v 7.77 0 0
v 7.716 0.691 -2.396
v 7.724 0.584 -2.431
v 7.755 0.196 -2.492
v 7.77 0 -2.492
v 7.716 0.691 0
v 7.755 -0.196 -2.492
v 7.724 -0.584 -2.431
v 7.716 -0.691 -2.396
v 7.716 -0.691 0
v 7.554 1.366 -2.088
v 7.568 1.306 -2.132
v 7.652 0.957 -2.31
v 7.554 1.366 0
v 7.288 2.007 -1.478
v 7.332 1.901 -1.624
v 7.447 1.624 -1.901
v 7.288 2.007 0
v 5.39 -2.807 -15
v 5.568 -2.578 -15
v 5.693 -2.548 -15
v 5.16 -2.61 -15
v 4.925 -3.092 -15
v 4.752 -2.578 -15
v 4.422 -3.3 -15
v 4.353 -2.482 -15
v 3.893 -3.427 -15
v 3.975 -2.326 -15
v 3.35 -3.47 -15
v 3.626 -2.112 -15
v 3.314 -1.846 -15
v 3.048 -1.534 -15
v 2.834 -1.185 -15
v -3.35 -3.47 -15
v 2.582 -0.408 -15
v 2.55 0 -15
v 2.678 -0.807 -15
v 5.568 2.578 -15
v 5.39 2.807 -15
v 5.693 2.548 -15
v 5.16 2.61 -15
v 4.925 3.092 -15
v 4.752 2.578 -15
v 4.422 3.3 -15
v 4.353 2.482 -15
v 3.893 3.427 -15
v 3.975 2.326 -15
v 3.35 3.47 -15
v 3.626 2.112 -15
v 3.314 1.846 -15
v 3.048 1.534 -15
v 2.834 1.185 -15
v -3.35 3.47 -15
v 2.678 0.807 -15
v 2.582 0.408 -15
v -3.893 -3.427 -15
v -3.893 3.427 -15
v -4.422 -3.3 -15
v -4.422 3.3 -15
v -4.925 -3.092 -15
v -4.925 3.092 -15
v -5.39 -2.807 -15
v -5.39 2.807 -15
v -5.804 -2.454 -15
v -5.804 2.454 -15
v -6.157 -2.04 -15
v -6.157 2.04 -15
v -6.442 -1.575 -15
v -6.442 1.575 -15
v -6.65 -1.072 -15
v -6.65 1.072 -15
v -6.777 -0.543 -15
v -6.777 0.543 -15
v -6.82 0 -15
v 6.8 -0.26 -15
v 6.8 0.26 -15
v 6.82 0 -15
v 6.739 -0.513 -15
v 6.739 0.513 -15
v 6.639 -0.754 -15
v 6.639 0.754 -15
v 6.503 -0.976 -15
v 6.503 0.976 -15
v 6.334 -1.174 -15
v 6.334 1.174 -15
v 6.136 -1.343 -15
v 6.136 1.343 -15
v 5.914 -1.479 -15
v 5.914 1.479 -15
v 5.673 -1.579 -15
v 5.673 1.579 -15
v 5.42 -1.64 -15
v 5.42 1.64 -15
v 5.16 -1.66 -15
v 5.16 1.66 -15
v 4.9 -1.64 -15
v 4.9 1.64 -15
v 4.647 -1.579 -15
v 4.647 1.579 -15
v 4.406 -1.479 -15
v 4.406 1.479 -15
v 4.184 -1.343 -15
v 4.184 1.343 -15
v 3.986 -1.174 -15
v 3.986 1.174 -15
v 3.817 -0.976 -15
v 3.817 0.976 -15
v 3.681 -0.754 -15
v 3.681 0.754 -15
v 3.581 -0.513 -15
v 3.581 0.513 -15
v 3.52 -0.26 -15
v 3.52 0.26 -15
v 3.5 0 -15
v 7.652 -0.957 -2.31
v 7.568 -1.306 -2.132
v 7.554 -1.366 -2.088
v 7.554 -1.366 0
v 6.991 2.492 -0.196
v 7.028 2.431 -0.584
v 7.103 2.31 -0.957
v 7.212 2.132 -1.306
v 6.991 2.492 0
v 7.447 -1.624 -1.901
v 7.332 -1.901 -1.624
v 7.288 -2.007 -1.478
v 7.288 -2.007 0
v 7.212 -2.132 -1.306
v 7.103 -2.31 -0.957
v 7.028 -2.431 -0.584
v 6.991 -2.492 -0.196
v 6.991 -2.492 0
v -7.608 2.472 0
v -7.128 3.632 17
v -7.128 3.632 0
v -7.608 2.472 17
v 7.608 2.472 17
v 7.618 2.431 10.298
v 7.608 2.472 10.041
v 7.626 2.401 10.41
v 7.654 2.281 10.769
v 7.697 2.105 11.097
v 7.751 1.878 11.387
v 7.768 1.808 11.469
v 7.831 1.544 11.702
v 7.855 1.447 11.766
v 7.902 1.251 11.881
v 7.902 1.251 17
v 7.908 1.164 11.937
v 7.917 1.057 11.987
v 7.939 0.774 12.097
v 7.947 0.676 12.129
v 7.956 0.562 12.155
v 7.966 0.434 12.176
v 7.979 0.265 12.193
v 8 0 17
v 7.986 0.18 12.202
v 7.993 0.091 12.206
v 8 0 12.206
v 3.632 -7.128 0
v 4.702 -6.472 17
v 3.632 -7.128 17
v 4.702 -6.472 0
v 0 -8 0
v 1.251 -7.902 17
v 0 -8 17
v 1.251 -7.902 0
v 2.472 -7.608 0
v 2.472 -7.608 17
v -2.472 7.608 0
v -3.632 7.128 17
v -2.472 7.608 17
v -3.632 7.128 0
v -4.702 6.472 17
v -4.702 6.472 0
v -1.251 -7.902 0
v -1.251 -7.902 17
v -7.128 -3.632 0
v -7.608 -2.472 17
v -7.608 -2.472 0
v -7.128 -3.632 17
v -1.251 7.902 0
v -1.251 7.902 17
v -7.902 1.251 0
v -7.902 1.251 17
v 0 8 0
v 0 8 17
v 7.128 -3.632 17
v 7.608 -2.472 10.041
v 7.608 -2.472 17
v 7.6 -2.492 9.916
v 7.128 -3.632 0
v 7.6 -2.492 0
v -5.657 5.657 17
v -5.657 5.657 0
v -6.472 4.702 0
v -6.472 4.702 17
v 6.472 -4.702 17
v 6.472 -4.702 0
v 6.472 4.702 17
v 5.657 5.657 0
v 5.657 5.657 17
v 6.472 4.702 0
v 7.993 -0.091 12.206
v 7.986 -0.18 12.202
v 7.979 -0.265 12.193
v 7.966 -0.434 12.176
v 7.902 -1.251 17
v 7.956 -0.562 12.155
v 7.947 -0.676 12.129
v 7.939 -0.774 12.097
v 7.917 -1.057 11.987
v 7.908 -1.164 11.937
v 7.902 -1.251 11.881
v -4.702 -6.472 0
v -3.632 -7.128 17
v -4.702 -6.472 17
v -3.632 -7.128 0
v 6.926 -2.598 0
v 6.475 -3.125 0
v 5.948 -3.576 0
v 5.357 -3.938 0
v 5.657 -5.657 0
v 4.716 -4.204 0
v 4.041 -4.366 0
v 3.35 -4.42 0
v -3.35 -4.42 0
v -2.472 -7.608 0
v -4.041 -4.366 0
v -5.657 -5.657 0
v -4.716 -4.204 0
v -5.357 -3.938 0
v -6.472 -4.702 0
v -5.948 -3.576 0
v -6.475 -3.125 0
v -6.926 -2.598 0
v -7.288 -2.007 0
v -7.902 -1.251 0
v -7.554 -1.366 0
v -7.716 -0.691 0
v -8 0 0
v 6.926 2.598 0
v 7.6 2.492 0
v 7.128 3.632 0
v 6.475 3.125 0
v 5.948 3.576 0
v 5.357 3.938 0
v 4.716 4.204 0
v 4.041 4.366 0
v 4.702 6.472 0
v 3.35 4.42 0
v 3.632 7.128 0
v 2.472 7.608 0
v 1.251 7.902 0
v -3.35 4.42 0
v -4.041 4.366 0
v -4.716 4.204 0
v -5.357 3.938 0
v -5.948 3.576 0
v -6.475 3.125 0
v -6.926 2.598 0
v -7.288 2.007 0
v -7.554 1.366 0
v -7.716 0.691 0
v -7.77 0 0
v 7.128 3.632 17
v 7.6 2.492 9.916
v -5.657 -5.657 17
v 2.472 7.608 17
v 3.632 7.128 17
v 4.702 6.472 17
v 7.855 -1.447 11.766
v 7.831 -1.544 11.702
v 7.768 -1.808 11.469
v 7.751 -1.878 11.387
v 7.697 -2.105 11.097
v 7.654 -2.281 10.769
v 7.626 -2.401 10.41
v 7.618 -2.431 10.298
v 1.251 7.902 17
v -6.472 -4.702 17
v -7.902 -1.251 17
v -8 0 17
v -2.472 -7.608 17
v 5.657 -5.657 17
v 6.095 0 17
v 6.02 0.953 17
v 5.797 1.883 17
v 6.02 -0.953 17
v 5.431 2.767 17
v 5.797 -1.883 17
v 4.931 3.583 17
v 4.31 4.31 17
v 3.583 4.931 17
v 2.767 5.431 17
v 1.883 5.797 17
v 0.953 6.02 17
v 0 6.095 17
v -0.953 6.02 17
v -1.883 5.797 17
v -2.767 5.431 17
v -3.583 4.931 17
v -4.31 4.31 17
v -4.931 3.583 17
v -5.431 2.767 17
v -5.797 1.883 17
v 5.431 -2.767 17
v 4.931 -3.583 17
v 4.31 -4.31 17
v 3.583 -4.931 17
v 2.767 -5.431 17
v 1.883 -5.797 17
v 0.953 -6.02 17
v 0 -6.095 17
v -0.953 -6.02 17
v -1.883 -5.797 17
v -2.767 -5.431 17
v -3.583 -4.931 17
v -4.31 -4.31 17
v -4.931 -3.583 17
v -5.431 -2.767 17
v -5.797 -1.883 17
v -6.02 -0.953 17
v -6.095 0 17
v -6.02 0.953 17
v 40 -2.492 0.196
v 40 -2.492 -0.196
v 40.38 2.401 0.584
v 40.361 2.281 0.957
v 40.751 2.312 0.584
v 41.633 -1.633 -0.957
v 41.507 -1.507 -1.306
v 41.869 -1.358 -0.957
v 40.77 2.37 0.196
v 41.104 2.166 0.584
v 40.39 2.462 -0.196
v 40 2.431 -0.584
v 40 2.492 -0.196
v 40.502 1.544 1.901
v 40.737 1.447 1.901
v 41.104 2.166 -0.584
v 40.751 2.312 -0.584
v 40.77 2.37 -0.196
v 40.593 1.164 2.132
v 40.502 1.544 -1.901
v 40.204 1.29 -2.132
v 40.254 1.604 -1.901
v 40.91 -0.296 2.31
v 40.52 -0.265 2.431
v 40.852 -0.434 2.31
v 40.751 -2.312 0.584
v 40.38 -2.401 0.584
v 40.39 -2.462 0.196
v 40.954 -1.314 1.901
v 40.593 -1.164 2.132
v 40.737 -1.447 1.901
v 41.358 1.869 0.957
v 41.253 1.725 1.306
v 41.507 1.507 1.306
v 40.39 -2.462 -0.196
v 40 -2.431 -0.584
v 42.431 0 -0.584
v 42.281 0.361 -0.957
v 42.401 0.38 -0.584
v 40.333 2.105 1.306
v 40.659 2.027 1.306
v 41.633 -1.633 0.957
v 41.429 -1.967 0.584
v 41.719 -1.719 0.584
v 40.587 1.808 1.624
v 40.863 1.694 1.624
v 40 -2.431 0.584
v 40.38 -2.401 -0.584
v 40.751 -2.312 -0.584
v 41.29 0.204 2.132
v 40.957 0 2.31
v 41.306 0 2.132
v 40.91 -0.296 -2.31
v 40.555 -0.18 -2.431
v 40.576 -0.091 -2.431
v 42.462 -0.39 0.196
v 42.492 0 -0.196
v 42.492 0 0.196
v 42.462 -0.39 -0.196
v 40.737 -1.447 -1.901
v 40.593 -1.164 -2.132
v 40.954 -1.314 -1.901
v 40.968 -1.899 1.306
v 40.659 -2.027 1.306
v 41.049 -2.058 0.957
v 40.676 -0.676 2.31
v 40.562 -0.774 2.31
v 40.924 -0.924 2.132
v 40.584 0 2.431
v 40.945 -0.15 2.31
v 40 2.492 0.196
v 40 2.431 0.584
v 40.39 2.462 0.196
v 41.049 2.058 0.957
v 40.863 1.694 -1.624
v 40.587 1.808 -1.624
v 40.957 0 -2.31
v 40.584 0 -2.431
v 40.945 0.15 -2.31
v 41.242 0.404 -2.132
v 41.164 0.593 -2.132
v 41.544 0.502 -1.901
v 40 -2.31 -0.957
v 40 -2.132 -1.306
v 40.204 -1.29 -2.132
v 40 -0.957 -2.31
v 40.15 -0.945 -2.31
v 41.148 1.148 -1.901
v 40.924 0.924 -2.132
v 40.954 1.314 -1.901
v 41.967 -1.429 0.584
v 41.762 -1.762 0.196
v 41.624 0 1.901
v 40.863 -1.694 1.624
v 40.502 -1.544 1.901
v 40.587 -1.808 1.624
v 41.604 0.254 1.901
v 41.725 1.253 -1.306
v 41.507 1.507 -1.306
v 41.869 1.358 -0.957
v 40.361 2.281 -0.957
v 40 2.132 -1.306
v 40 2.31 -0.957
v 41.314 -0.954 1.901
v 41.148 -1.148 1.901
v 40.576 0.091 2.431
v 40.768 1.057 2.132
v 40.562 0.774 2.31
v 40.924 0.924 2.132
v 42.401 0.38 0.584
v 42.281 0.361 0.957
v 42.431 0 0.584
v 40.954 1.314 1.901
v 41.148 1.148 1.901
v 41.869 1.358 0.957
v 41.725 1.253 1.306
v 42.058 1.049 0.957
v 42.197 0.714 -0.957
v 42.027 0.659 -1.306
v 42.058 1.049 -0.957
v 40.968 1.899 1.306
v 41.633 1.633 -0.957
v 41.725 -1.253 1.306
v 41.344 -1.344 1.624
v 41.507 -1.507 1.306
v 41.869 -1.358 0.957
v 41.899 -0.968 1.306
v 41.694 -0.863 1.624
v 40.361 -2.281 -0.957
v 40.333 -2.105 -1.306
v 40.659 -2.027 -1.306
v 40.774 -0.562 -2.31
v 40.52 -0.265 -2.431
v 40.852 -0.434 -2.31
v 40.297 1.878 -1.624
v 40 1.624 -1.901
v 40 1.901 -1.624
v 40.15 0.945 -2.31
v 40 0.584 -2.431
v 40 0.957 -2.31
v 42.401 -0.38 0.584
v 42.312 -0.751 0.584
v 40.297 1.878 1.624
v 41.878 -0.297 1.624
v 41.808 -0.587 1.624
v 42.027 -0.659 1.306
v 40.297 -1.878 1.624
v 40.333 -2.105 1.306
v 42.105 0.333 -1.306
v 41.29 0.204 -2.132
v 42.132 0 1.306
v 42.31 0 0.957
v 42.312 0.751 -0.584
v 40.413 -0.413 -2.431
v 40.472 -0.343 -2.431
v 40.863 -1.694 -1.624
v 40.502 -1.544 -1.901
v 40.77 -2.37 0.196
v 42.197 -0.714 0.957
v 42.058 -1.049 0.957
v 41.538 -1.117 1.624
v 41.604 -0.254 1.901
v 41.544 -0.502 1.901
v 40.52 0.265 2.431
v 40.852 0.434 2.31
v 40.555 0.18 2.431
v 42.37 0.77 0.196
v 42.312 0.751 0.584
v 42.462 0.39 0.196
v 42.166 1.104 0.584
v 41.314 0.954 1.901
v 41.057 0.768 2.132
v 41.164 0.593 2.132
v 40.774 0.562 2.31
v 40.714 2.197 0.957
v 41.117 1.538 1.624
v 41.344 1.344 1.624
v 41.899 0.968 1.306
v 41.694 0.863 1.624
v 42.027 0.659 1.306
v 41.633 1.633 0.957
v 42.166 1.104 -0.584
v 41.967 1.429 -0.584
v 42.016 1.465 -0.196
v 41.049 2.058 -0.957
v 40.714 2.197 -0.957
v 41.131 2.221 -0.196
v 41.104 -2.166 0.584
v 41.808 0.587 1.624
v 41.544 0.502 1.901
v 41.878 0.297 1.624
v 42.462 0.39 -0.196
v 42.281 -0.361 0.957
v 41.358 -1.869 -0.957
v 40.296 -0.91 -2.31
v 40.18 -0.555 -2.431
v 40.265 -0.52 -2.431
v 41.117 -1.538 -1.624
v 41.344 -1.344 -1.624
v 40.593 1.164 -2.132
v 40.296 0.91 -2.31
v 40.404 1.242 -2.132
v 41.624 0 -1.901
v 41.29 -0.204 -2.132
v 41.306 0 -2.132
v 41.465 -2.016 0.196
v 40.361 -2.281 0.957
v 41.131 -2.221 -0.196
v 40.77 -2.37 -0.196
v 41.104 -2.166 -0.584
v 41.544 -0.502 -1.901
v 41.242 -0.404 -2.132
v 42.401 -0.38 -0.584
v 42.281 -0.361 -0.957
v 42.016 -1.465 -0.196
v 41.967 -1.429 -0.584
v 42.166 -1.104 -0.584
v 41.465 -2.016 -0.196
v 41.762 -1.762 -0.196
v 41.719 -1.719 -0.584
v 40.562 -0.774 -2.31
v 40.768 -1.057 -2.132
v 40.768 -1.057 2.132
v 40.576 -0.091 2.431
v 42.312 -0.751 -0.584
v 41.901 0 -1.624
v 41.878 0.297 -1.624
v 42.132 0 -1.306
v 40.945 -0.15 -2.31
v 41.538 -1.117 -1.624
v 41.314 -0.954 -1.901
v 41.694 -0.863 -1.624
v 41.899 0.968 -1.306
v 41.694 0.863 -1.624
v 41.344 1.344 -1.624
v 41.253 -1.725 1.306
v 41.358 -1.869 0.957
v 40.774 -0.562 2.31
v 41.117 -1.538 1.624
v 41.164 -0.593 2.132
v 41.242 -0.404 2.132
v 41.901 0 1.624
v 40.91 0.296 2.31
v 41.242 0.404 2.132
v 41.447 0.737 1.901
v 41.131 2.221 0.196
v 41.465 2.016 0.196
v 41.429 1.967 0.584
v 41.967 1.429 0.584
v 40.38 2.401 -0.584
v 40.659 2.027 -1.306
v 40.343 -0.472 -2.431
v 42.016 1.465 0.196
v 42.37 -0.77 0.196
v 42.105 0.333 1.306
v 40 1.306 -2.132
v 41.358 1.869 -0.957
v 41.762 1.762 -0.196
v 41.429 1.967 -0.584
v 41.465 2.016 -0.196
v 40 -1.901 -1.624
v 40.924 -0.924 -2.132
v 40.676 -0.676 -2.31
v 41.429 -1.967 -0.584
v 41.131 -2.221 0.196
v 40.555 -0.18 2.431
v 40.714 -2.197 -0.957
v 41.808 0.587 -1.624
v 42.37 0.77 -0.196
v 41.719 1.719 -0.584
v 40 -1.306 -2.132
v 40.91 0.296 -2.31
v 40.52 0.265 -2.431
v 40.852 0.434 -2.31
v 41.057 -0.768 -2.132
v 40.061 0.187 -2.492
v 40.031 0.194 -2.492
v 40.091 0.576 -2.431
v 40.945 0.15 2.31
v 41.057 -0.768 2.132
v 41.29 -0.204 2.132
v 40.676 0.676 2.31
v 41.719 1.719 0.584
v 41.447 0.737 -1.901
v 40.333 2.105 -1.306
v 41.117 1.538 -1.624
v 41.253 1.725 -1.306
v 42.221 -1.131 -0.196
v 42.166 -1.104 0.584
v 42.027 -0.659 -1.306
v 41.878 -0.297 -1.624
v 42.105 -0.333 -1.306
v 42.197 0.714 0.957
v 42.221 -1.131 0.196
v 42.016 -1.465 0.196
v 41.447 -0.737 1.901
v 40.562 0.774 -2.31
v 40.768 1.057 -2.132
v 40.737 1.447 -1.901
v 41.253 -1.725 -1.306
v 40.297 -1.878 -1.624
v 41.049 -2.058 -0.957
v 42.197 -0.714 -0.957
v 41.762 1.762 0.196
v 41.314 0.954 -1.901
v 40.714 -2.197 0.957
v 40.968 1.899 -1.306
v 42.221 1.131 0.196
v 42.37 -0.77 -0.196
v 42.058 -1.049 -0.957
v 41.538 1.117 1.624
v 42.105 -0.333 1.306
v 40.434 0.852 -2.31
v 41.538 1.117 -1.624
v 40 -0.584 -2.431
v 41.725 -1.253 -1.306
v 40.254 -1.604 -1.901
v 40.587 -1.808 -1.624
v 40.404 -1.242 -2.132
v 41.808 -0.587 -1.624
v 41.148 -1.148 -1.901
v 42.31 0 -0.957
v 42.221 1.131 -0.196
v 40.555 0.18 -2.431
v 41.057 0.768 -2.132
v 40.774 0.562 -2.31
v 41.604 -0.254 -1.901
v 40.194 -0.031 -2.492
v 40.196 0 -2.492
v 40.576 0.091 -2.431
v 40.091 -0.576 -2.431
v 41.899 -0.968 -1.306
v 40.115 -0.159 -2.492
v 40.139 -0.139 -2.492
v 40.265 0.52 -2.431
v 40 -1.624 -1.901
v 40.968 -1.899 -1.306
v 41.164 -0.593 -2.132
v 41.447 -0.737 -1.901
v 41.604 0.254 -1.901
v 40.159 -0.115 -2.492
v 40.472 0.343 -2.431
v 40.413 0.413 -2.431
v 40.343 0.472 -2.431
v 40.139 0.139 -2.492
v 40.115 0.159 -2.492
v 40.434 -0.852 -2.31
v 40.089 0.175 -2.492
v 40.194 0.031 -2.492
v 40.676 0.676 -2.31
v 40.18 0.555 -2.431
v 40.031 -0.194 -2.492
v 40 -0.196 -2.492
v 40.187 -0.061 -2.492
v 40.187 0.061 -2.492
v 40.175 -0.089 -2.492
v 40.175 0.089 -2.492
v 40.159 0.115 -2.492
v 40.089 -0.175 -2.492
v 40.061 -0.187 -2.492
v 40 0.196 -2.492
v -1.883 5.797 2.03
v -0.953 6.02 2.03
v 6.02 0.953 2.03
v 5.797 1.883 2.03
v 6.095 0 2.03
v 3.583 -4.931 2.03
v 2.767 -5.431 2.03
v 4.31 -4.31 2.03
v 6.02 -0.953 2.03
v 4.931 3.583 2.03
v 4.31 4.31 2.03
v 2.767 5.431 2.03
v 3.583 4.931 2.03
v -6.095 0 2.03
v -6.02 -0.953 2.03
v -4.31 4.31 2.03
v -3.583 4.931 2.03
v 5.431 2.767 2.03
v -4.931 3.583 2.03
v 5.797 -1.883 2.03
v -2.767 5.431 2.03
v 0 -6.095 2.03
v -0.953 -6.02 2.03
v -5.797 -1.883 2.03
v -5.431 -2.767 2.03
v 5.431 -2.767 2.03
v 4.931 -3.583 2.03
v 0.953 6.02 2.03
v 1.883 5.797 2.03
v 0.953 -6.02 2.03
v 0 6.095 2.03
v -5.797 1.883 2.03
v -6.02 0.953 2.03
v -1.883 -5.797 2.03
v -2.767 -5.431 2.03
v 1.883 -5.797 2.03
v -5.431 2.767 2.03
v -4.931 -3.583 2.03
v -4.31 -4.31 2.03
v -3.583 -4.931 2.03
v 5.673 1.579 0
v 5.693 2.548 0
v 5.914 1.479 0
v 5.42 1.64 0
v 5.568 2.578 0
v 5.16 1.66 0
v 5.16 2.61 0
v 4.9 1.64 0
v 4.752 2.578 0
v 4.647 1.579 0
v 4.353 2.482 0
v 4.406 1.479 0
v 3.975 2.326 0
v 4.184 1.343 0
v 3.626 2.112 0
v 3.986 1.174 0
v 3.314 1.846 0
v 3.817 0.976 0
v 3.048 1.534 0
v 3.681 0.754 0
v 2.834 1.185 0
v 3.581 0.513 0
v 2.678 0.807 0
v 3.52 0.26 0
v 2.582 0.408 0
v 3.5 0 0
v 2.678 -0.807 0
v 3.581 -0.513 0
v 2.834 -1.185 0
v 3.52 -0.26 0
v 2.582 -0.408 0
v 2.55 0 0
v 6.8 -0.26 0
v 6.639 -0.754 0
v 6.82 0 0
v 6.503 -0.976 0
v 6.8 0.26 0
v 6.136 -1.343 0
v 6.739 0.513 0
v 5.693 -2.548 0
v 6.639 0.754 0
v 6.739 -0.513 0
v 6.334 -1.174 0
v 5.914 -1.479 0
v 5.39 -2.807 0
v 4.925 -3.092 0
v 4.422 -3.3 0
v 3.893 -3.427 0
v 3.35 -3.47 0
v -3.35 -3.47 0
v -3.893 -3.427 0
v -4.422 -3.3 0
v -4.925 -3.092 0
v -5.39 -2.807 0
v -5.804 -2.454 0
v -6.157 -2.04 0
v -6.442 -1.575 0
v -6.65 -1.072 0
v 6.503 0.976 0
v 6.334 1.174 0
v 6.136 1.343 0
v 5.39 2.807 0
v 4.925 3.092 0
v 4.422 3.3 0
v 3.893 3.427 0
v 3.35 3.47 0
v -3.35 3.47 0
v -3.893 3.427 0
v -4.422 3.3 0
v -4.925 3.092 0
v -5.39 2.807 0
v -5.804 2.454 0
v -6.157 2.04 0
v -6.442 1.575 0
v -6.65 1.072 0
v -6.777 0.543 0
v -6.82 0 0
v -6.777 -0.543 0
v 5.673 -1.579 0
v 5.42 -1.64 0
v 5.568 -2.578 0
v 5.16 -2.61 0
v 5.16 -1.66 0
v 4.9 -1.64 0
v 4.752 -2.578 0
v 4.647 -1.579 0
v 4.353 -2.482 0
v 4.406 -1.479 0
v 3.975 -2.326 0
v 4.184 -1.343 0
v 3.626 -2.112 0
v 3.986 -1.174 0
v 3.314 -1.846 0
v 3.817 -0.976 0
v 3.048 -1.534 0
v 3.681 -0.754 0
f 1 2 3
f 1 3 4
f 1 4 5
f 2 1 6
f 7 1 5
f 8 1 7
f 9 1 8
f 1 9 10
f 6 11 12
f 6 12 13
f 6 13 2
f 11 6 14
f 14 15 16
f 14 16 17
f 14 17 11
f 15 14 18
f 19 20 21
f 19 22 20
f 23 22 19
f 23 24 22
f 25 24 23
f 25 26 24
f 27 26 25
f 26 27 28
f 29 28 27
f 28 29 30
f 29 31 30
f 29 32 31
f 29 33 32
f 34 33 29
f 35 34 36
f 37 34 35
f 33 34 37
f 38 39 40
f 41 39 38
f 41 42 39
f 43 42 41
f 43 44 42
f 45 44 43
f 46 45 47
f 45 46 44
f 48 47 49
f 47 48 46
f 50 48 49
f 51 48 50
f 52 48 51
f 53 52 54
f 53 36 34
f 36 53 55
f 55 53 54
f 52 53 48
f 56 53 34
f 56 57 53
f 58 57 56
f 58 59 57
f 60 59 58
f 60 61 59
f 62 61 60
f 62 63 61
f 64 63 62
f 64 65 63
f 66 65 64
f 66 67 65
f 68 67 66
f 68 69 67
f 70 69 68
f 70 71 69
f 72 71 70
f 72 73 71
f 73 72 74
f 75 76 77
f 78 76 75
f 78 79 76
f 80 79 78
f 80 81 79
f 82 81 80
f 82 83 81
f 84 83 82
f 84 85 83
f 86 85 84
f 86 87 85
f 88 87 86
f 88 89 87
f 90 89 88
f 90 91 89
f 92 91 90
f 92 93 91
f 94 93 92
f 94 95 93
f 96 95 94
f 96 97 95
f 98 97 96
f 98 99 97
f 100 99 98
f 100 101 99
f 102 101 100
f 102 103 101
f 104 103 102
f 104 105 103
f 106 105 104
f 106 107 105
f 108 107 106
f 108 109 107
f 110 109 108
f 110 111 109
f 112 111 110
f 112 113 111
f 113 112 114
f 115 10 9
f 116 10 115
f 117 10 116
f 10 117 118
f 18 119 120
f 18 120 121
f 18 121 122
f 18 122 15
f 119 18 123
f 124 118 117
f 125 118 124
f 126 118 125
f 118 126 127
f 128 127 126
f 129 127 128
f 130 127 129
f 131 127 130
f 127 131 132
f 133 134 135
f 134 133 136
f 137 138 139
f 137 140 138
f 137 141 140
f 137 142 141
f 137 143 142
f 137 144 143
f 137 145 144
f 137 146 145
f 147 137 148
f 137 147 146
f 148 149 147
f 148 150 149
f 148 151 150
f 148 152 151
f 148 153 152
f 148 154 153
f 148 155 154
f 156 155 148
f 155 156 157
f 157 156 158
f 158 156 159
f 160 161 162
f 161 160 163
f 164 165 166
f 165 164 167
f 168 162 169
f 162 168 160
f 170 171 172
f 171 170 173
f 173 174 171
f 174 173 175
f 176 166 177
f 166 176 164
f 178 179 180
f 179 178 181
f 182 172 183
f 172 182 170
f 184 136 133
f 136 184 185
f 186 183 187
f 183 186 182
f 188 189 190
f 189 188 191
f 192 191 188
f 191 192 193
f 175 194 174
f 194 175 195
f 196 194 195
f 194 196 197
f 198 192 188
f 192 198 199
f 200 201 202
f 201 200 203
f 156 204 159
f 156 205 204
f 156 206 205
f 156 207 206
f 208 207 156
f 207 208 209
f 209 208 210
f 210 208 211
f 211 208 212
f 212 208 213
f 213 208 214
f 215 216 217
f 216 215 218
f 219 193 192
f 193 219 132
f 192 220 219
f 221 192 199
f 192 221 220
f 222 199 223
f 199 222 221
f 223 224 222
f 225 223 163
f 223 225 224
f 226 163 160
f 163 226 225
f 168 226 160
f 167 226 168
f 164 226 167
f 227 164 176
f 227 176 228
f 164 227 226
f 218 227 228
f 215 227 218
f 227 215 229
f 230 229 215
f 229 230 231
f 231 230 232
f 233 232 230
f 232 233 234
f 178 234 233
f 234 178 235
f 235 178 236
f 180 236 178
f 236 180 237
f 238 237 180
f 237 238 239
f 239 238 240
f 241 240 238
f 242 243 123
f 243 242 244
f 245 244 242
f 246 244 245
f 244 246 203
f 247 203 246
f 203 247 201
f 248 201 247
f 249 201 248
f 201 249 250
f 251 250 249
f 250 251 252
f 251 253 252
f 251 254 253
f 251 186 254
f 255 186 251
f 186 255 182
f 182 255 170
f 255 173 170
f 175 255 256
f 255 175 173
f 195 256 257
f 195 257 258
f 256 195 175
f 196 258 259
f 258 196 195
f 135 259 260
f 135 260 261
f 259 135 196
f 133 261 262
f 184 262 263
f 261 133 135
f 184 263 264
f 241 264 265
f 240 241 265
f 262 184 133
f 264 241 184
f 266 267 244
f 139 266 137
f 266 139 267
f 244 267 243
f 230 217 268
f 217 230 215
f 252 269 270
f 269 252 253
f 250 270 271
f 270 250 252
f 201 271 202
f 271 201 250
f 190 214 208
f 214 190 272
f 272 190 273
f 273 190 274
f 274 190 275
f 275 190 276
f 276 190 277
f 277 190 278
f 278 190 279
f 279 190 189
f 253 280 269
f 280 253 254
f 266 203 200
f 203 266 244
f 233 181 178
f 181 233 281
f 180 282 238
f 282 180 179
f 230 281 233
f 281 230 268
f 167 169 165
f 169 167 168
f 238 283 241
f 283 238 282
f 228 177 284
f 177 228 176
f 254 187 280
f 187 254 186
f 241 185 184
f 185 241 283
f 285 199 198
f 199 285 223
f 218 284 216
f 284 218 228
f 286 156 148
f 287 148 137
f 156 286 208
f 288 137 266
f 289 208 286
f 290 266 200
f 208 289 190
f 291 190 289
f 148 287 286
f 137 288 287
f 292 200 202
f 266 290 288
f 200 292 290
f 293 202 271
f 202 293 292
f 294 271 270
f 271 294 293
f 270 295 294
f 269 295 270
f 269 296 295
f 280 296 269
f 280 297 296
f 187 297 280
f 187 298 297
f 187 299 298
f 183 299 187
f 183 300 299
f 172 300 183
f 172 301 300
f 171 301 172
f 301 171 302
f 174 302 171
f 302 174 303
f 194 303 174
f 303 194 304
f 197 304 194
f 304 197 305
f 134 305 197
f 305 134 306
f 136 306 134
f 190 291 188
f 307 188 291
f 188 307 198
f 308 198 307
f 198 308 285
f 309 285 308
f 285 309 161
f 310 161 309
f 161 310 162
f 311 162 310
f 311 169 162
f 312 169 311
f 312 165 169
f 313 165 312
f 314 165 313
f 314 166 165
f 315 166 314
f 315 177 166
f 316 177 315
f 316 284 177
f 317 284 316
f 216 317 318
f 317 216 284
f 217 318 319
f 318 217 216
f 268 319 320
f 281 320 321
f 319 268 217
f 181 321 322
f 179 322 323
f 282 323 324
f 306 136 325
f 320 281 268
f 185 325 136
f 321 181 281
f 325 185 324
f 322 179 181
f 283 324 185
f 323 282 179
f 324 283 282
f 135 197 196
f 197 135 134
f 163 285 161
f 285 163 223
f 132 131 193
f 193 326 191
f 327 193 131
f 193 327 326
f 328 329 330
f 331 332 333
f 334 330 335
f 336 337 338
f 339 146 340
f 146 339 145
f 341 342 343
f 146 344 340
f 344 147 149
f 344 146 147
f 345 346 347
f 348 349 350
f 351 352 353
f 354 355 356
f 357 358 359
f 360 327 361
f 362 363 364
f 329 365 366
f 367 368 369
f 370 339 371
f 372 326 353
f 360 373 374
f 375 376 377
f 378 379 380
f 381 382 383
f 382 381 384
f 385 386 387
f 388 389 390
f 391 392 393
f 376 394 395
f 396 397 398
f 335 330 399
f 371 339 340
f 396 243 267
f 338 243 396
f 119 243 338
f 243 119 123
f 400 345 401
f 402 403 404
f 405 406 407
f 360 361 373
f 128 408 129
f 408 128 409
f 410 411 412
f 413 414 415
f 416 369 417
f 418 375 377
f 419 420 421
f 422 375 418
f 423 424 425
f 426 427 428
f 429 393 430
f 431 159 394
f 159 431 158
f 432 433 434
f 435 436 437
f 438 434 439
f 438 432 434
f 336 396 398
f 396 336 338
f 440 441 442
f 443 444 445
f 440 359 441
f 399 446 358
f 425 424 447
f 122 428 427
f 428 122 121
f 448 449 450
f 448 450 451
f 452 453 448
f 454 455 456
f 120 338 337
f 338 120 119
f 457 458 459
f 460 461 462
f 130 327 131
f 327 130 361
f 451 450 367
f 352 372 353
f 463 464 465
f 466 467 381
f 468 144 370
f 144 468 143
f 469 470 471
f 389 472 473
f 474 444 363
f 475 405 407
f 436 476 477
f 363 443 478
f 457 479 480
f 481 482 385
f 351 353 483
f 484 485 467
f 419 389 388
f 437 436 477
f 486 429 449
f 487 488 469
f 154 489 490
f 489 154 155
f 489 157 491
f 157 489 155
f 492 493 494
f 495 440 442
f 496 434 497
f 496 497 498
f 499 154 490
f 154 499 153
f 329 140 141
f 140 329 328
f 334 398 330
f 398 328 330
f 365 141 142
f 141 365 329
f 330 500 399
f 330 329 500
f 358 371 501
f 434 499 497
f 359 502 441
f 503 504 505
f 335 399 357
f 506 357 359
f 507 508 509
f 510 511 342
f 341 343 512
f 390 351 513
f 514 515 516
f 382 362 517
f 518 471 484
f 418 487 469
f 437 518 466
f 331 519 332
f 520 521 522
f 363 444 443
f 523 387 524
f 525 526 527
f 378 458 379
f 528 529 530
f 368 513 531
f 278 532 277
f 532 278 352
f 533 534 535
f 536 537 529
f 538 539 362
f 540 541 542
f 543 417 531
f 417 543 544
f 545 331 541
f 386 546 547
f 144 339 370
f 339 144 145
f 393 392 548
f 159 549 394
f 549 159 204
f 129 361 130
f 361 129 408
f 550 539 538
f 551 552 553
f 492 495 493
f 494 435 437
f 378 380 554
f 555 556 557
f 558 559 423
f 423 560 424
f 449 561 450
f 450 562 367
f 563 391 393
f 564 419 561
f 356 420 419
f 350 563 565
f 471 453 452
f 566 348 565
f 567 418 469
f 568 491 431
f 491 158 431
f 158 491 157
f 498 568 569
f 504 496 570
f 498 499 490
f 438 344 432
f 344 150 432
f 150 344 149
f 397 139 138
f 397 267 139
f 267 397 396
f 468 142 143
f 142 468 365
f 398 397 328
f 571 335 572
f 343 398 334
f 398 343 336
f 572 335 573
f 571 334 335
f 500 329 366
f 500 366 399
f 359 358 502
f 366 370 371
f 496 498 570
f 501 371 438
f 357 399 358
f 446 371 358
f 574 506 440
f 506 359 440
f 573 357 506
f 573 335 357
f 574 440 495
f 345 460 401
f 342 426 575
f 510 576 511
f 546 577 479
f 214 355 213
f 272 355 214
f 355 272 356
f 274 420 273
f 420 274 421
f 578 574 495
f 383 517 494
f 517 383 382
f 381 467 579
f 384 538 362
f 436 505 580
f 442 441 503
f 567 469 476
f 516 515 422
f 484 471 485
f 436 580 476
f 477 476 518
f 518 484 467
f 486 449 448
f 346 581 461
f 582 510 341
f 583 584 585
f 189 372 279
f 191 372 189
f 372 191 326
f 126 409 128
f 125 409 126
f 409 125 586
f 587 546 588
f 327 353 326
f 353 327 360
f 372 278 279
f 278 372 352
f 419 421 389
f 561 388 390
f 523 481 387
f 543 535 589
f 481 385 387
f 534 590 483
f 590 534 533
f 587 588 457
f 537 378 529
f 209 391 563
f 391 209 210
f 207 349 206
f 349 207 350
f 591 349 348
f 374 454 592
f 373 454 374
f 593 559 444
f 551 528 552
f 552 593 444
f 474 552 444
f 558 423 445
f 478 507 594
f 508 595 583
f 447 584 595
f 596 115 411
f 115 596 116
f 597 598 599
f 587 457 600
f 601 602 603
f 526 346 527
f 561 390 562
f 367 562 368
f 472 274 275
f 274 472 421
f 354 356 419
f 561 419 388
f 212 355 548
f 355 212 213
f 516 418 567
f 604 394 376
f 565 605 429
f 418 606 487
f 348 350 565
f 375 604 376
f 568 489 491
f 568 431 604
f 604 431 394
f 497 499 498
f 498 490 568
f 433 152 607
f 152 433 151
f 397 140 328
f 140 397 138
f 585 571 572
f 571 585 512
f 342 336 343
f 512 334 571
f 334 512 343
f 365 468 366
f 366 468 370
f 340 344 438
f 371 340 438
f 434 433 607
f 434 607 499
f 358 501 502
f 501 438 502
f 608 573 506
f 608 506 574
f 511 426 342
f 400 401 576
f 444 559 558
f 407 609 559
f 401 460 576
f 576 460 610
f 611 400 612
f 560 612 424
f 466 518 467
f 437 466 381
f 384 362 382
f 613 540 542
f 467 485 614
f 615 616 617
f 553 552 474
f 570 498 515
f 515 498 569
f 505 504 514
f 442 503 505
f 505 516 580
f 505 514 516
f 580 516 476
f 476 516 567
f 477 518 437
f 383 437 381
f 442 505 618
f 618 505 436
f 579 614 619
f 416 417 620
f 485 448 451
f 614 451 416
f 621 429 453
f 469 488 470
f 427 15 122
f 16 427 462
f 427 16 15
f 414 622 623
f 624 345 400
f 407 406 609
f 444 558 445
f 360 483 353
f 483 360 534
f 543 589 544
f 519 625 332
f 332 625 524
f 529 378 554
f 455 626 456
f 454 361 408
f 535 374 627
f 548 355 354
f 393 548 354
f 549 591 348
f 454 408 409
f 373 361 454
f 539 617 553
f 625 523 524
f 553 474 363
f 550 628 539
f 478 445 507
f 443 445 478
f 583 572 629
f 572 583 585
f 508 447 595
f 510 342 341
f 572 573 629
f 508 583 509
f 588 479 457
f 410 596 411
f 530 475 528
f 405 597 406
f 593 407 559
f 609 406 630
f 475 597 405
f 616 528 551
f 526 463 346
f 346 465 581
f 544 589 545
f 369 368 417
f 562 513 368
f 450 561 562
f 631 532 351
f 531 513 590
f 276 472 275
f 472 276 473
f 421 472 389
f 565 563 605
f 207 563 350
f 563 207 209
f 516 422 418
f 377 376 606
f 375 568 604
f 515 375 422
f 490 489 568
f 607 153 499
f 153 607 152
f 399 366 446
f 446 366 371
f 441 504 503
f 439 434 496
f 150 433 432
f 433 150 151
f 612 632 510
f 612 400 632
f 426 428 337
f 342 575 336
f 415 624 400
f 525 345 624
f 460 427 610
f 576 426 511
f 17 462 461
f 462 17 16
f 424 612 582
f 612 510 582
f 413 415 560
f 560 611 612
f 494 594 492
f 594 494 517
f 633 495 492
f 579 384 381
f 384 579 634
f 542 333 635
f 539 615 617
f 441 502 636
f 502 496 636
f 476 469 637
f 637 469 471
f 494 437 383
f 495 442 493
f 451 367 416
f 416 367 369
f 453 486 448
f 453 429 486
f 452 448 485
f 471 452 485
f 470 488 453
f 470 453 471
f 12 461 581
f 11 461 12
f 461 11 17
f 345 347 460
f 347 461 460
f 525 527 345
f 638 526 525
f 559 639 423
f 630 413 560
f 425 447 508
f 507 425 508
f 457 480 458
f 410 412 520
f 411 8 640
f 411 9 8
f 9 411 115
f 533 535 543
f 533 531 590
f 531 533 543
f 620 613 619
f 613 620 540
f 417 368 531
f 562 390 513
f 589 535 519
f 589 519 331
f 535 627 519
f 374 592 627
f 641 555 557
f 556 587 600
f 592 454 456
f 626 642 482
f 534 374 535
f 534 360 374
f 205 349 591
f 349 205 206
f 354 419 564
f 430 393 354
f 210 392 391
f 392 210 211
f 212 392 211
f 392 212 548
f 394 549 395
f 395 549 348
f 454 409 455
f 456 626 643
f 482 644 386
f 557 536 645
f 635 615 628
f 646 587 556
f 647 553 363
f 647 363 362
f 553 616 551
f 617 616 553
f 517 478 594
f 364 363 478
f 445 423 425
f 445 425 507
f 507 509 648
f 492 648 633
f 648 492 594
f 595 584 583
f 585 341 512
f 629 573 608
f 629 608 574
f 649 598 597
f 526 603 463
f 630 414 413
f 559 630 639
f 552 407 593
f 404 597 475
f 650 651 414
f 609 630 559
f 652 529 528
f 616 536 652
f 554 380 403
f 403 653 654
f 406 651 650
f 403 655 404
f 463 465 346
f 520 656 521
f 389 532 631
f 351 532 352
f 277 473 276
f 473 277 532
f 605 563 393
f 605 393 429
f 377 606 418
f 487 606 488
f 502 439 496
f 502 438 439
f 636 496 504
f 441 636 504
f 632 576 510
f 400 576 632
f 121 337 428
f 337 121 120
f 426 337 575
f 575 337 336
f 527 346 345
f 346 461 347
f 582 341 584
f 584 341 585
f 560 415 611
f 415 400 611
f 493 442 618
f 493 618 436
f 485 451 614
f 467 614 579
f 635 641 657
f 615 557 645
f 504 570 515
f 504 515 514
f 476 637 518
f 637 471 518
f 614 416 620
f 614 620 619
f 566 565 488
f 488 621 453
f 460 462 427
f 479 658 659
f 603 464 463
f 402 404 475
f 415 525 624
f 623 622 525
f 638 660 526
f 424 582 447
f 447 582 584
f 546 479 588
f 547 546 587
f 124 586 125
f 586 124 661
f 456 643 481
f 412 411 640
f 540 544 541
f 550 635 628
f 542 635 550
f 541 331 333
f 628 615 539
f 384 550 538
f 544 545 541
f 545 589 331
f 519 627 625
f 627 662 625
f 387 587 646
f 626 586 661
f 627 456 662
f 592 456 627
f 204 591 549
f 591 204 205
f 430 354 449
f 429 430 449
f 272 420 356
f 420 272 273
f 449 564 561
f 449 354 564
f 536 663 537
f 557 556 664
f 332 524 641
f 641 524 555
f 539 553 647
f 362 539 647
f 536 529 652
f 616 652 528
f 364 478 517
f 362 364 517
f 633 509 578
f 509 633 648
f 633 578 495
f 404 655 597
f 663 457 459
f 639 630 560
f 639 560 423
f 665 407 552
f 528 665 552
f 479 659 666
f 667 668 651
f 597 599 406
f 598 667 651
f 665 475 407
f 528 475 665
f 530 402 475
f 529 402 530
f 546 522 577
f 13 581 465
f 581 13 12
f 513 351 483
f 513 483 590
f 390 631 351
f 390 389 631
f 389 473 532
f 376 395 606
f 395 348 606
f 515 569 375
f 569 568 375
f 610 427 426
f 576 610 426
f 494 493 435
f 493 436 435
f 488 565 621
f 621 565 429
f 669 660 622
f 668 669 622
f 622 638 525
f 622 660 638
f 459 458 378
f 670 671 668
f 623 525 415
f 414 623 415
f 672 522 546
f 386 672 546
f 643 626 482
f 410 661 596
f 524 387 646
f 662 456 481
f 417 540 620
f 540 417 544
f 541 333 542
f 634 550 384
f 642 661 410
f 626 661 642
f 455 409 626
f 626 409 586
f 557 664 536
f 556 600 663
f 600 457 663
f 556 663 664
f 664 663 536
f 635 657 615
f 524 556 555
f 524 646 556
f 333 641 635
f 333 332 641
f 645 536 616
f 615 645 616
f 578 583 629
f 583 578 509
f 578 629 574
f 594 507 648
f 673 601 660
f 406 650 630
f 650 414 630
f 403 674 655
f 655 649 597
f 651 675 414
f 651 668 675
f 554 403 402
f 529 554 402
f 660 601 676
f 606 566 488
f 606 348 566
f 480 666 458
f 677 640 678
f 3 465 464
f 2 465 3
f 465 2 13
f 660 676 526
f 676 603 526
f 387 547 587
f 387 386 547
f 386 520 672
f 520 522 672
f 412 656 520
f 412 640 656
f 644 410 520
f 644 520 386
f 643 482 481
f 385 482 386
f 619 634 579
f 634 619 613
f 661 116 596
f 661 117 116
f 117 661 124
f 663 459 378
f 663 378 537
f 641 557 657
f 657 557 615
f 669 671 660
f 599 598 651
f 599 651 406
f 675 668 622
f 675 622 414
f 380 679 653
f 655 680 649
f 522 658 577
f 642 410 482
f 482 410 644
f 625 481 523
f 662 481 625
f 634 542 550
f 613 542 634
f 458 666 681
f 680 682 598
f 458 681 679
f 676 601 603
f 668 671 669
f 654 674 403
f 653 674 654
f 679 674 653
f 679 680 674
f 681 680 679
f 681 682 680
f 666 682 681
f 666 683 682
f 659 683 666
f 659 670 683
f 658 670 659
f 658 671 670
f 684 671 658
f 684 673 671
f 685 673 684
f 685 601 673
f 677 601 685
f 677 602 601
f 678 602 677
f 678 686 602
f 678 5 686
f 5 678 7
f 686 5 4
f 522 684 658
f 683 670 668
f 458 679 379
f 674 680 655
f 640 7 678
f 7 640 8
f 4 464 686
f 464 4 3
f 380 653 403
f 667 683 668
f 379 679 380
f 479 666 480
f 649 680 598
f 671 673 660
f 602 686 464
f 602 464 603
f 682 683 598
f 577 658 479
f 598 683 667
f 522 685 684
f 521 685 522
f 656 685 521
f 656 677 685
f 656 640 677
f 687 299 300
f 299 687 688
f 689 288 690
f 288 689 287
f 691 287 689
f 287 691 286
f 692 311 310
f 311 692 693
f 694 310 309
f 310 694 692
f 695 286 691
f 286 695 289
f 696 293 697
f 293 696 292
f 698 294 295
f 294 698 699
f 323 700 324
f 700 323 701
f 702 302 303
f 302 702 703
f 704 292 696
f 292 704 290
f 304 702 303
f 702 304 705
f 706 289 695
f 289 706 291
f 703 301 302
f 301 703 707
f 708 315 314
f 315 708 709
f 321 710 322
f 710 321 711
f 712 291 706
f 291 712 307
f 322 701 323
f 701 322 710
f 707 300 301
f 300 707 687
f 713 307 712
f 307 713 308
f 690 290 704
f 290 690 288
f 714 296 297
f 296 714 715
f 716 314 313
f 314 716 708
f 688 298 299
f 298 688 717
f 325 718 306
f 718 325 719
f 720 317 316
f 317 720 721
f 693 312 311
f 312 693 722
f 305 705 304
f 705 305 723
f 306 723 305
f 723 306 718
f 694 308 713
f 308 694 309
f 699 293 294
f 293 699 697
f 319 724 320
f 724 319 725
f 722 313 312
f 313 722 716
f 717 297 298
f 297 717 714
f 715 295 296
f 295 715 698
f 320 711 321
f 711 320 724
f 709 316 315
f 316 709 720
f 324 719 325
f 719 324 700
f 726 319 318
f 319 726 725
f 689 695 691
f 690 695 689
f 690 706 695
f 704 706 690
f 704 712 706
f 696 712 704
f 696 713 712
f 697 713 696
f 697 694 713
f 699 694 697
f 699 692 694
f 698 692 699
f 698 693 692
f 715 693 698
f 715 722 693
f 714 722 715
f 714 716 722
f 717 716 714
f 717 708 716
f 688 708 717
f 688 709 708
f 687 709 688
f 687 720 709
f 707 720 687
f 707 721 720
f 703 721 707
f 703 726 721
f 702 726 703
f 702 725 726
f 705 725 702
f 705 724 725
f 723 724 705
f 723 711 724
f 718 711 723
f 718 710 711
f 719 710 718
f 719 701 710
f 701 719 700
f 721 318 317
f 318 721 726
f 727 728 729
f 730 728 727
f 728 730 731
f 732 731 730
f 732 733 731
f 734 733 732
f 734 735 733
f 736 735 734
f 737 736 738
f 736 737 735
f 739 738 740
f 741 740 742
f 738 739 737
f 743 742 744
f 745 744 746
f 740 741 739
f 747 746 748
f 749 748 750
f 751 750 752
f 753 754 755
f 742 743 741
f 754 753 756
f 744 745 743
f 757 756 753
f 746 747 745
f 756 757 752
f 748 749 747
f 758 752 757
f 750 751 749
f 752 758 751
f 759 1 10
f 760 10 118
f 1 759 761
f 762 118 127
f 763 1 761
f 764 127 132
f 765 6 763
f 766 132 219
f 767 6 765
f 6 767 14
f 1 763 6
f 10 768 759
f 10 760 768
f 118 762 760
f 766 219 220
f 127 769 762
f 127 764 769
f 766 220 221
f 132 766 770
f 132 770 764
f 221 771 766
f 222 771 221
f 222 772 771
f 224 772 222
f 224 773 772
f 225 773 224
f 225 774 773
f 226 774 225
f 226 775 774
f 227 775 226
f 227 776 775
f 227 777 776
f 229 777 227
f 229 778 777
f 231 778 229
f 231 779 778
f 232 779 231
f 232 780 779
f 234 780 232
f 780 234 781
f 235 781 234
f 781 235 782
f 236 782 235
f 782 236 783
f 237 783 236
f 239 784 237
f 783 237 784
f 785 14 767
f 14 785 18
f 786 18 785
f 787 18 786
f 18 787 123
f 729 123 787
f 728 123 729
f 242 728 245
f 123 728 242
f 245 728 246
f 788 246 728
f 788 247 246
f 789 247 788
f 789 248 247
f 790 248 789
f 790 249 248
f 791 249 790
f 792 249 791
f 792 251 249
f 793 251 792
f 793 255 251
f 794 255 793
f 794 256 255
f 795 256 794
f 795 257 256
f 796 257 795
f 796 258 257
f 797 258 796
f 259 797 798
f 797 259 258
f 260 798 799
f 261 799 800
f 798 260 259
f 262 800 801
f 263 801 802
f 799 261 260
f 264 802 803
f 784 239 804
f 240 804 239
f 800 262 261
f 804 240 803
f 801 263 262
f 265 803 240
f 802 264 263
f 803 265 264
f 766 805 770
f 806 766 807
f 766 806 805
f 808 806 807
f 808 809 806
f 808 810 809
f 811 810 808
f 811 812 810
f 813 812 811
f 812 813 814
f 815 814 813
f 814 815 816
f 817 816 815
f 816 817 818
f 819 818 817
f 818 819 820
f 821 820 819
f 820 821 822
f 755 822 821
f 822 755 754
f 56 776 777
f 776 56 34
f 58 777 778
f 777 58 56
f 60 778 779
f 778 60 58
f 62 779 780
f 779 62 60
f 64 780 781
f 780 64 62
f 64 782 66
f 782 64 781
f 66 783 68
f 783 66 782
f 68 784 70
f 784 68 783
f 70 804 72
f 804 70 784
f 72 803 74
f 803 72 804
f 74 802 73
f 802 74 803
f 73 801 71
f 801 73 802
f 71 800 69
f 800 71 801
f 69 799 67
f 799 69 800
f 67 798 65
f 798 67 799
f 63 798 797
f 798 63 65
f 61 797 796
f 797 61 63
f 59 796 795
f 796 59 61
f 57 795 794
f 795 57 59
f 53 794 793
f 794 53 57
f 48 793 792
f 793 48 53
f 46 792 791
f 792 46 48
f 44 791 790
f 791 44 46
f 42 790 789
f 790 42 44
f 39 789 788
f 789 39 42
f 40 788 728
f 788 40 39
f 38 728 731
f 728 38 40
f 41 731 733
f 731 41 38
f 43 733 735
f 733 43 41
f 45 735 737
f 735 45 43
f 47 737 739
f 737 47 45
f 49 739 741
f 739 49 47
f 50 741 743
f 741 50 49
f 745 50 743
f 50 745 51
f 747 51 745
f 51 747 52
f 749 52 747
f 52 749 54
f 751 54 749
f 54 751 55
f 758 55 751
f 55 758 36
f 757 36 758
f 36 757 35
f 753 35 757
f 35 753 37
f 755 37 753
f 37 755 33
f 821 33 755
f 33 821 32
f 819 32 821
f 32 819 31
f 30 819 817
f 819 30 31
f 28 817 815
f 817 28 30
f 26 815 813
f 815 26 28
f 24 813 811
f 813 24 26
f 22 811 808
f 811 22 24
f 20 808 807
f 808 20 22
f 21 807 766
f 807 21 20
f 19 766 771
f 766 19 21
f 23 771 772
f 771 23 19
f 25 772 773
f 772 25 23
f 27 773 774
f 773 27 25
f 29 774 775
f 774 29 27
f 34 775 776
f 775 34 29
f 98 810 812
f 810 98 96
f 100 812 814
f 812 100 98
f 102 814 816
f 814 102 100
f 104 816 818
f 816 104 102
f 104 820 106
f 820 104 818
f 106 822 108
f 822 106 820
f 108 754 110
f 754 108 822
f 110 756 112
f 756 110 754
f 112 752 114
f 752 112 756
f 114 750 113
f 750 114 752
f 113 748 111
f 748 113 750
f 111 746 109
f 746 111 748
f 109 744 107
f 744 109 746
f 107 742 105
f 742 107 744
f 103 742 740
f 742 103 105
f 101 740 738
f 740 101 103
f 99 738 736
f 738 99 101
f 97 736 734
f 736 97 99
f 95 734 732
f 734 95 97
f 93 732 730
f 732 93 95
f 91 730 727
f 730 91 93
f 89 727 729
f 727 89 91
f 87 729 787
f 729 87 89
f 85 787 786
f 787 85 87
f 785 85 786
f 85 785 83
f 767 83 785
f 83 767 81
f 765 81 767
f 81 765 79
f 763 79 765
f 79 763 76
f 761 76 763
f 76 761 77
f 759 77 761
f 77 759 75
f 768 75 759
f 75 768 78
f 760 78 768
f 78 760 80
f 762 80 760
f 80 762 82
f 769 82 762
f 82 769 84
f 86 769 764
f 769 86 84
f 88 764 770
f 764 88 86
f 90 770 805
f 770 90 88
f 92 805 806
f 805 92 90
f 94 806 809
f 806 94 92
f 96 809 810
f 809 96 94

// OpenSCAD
$fn=40;

mast_height=50;

module mast2d(){
    outside_width=8.84;
    inside_width=6.94;
    center_distance=6.7; // The distance between the two centers that make up the mast
    rope_inside_diameter=3.32;
    rope_outside_diameter=5.22;
    
    module mastOval(diameter){
        hull(){
            translate([center_distance/2,0]) circle(d=diameter);
            translate([-center_distance/2,0]) circle(d=diameter);
        }
    }
    
    // Outer shell
    difference(){
        mastOval(outside_width);
        mastOval(inside_width);
    }
    
    translate([center_distance/2+outside_width/2-rope_outside_diameter/2, 0])
        difference(){
            circle(d=rope_outside_diameter);
            circle(d=rope_inside_diameter);
        }
}

module ma3(){
    // Attachment point is bottom of thread area.
    height=14.98;
    diameter=12.19;
    thread_height=7.62;
    thread_diameter=9.5;
    shaft_height=9.65;
    shaft_diameter=3.14;
    
    translate([0,0,-height]) cylinder(d=diameter, h=height);
    cylinder(d=thread_diameter, h=thread_height);
    translate([0,0,thread_height]) cylinder(d=shaft_diameter, h=shaft_height);
}

 crane_length=40;
crane_height=12;
crane_thickness=5;
ma3_holder_diameter=16;
ma3_holder_height=17;

difference(){
    union(){
        mast_overlap_distance=15;
        translate([0,0,-mast_overlap_distance]) hull() linear_extrude(mast_overlap_distance+0.01) mast2d();

       
        // ma3 shell
        cylinder(d=ma3_holder_diameter, h=ma3_holder_height);

        // crane
        corners = [
            //top
            [0,0,crane_height],
            //right
            [crane_length,0,0],
            //bottom
            [0,0,0]
        ];


        hull() for(corner=corners){
            translate(corner) sphere(d=crane_thickness);
        }
    }
    #translate([0,0,ma3_holder_height+0.01]) ma3();
    #translate([0,0,-mast_height]) linear_extrude(mast_height) mast2d();
}
